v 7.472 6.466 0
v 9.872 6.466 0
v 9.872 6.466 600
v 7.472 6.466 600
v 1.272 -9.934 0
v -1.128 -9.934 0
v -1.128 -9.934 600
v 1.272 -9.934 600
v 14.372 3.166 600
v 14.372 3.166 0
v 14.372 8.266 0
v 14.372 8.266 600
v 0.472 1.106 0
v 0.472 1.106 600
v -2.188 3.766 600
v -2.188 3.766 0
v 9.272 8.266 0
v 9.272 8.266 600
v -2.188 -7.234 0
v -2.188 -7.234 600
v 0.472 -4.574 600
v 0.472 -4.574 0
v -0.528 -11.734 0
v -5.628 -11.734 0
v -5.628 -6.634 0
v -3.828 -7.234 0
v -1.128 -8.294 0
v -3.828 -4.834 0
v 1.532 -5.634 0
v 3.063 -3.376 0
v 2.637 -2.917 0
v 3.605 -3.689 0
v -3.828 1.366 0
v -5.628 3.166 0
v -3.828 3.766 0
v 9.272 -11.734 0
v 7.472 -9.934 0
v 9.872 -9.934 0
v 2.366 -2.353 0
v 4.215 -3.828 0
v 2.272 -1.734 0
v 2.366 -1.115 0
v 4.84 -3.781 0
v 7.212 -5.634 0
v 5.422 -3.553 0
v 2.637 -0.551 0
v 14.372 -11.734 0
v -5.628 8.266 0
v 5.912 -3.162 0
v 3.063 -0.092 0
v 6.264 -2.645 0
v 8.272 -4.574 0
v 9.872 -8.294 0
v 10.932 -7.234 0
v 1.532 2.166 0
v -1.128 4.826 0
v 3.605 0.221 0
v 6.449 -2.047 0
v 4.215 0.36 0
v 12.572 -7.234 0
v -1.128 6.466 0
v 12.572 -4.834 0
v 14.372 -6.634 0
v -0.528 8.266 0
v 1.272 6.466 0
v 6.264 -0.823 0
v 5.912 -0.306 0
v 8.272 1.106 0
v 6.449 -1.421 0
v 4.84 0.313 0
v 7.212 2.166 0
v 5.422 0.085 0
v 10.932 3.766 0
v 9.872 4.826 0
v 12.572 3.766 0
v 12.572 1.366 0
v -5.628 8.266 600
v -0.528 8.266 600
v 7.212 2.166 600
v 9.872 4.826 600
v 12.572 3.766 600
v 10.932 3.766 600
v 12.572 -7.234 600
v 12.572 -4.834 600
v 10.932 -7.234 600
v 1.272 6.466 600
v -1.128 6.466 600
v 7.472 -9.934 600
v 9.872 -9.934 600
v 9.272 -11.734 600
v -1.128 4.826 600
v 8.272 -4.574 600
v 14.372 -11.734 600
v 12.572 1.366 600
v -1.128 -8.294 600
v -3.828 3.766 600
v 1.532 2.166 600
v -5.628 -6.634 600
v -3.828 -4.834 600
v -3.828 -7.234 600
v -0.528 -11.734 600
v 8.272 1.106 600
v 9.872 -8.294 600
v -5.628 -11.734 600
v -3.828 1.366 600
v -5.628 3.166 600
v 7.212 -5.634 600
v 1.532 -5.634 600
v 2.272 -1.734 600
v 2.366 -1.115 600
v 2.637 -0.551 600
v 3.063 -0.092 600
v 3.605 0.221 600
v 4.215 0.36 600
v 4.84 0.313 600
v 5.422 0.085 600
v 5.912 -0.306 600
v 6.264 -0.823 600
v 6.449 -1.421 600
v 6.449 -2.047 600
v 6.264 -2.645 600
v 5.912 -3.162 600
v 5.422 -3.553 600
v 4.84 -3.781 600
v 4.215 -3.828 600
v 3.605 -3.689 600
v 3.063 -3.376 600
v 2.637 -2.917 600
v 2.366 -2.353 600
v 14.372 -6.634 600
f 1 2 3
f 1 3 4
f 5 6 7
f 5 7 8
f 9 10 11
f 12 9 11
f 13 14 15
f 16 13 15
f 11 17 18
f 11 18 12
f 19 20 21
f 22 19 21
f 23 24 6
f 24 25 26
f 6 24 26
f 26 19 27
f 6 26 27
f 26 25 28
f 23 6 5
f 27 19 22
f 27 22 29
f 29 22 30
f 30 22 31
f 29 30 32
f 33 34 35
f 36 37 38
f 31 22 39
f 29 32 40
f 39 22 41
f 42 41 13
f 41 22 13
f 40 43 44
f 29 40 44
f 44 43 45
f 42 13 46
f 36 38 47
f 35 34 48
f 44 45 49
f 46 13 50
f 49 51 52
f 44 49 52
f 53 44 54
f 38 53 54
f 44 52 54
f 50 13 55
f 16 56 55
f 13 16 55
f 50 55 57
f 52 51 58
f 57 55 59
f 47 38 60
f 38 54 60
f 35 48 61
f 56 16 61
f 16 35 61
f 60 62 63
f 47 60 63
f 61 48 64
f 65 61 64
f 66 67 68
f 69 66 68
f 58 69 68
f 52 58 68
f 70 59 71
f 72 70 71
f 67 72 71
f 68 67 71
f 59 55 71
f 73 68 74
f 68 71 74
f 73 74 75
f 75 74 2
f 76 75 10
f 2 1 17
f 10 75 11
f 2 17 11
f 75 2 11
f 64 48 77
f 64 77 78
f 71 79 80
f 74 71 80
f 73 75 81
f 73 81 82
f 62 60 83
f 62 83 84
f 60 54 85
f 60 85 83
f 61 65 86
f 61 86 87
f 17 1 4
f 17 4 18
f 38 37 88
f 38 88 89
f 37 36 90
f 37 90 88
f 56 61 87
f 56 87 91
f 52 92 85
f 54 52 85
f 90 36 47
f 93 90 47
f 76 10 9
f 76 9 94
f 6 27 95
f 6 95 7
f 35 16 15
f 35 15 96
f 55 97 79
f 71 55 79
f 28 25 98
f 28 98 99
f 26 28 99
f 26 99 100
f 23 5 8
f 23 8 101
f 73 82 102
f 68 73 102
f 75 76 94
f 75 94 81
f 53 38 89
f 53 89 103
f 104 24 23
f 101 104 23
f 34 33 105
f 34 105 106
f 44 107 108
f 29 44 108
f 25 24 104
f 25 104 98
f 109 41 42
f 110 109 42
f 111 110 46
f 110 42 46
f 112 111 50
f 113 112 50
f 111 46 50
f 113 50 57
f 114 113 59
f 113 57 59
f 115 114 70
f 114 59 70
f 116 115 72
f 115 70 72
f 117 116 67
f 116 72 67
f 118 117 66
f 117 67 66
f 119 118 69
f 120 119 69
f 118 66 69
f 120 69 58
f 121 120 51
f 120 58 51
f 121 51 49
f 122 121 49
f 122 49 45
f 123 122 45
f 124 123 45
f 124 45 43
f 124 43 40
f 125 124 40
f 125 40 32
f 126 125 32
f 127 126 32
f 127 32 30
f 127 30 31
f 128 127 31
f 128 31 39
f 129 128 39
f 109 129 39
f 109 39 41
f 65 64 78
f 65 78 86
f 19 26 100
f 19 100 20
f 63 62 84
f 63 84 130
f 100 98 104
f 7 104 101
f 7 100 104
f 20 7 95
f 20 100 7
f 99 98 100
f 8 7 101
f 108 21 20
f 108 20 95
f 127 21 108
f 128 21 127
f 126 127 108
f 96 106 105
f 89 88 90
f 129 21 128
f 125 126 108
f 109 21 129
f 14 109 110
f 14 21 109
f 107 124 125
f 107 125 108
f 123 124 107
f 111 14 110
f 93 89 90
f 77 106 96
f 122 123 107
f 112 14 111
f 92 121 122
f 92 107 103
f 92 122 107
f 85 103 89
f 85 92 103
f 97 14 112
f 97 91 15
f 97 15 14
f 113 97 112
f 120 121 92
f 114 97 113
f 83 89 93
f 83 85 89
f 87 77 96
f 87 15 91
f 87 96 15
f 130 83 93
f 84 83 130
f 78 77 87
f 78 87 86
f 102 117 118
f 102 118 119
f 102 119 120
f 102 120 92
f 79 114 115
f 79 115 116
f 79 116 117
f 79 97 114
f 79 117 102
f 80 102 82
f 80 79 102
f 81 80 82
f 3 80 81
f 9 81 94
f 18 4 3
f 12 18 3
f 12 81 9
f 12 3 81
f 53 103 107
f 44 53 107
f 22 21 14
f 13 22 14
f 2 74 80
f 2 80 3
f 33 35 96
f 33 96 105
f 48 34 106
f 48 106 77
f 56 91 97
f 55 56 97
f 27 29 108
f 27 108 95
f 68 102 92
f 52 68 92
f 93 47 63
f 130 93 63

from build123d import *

# Parameters (mm, degrees)
ESQUISSE1_W             = 20
ESQUISSE1_H             = 20
BOSS_EXTRU_1_DEPTH      = 600
ENL_V_MAT_EXTRU_1_REACH = 602.287
ESQUISSE2_R             = 2.1


with BuildPart() as part:
    # Esquisse1 → Boss.-Extru.1 (new body)
    with BuildSketch(Plane.XY):
        with Locations((4.37228125, -1.733873274)):
            Rectangle(ESQUISSE1_W, ESQUISSE1_H)
    extrude(amount=BOSS_EXTRU_1_DEPTH)

    # Esquisse2 → Enlèv. mat.-Extru.1 (cut, up to next)
    with BuildSketch(Plane(origin=(0, 0, 0), x_dir=(-1, 0, 0), z_dir=(0, 0, -1)), mode=Mode.PRIVATE) as enl_v_mat_extru_1_sk1:
        with Locations((-4.37228125, -1.733873274)):
            Circle(ESQUISSE2_R)
    enl_v_mat_extru_1_tool1 = extrude(enl_v_mat_extru_1_sk1.sketch, amount=-ENL_V_MAT_EXTRU_1_REACH, mode=Mode.PRIVATE) & part.part
    # Esquisse2 → Enlèv. mat.-Extru.1 (cut, up to next)
    with BuildSketch(Plane(origin=(0, 0, 0), x_dir=(-1, 0, 0), z_dir=(0, 0, -1)), mode=Mode.PRIVATE) as enl_v_mat_extru_1_sk2:
        Polygon((-9.27228125, 8.266126726), (0.52771875, 8.266126726), (-1.27228125, 6.466126726), (1.12771875, 6.466126726), (1.12771875, 4.826126726), (-1.53228125, 2.166126726), (-7.21228125, 2.166126726), (-9.87228125, 4.826126726), (-9.87228125, 6.466126726), (-7.47228125, 6.466126726), align=None)
    enl_v_mat_extru_1_tool2 = extrude(enl_v_mat_extru_1_sk2.sketch, amount=-ENL_V_MAT_EXTRU_1_REACH, mode=Mode.PRIVATE) & part.part
    # Esquisse2 → Enlèv. mat.-Extru.1 (cut, up to next)
    with BuildSketch(Plane(origin=(0, 0, 0), x_dir=(-1, 0, 0), z_dir=(0, 0, -1)), mode=Mode.PRIVATE) as enl_v_mat_extru_1_sk3:
        Polygon((2.18771875, -7.233873274), (-0.47228125, -4.573873274), (-0.47228125, 1.106126726), (2.18771875, 3.766126726), (3.82771875, 3.766126726), (3.82771875, 1.366126726), (5.62771875, 3.166126726), (5.62771875, -6.633873274), (3.82771875, -4.833873274), (3.82771875, -7.233873274), align=None)
    enl_v_mat_extru_1_tool3 = extrude(enl_v_mat_extru_1_sk3.sketch, amount=-ENL_V_MAT_EXTRU_1_REACH, mode=Mode.PRIVATE) & part.part
    # Esquisse2 → Enlèv. mat.-Extru.1 (cut, up to next)
    with BuildSketch(Plane(origin=(0, 0, 0), x_dir=(-1, 0, 0), z_dir=(0, 0, -1)), mode=Mode.PRIVATE) as enl_v_mat_extru_1_sk4:
        Polygon((-9.87228125, -8.293873274), (-7.21228125, -5.633873274), (-1.53228125, -5.633873274), (1.12771875, -8.293873274), (1.12771875, -9.933873274), (-1.27228125, -9.933873274), (0.52771875, -11.733873274), (-9.27228125, -11.733873274), (-7.47228125, -9.933873274), (-9.87228125, -9.933873274), align=None)
    enl_v_mat_extru_1_tool4 = extrude(enl_v_mat_extru_1_sk4.sketch, amount=-ENL_V_MAT_EXTRU_1_REACH, mode=Mode.PRIVATE) & part.part
    # Esquisse2 → Enlèv. mat.-Extru.1 (cut, up to next)
    with BuildSketch(Plane(origin=(0, 0, 0), x_dir=(-1, 0, 0), z_dir=(0, 0, -1)), mode=Mode.PRIVATE) as enl_v_mat_extru_1_sk5:
        Polygon((-10.93228125, 3.766126726), (-8.27228125, 1.106126726), (-8.27228125, -4.573873274), (-10.93228125, -7.233873274), (-12.57228125, -7.233873274), (-12.57228125, -4.833873274), (-14.37228125, -6.633873274), (-14.37228125, 3.166126726), (-12.57228125, 1.366126726), (-12.57228125, 3.766126726), align=None)
    enl_v_mat_extru_1_tool5 = extrude(enl_v_mat_extru_1_sk5.sketch, amount=-ENL_V_MAT_EXTRU_1_REACH, mode=Mode.PRIVATE) & part.part
    add(enl_v_mat_extru_1_tool1.solids().sort_by_distance((4.372281, -1.733873, 0))[0], mode=Mode.SUBTRACT)
    add(enl_v_mat_extru_1_tool2.solids().sort_by_distance((4.372281, 5.301599, 0))[0], mode=Mode.SUBTRACT)
    add(enl_v_mat_extru_1_tool3.solids().sort_by_distance((-2.663191, -1.733873, 0))[0], mode=Mode.SUBTRACT)
    add(enl_v_mat_extru_1_tool4.solids().sort_by_distance((4.372281, -8.769346, 0))[0], mode=Mode.SUBTRACT)
    add(enl_v_mat_extru_1_tool5.solids().sort_by_distance((11.407754, -1.733873, 0))[0], mode=Mode.SUBTRACT)


solid = part.part
